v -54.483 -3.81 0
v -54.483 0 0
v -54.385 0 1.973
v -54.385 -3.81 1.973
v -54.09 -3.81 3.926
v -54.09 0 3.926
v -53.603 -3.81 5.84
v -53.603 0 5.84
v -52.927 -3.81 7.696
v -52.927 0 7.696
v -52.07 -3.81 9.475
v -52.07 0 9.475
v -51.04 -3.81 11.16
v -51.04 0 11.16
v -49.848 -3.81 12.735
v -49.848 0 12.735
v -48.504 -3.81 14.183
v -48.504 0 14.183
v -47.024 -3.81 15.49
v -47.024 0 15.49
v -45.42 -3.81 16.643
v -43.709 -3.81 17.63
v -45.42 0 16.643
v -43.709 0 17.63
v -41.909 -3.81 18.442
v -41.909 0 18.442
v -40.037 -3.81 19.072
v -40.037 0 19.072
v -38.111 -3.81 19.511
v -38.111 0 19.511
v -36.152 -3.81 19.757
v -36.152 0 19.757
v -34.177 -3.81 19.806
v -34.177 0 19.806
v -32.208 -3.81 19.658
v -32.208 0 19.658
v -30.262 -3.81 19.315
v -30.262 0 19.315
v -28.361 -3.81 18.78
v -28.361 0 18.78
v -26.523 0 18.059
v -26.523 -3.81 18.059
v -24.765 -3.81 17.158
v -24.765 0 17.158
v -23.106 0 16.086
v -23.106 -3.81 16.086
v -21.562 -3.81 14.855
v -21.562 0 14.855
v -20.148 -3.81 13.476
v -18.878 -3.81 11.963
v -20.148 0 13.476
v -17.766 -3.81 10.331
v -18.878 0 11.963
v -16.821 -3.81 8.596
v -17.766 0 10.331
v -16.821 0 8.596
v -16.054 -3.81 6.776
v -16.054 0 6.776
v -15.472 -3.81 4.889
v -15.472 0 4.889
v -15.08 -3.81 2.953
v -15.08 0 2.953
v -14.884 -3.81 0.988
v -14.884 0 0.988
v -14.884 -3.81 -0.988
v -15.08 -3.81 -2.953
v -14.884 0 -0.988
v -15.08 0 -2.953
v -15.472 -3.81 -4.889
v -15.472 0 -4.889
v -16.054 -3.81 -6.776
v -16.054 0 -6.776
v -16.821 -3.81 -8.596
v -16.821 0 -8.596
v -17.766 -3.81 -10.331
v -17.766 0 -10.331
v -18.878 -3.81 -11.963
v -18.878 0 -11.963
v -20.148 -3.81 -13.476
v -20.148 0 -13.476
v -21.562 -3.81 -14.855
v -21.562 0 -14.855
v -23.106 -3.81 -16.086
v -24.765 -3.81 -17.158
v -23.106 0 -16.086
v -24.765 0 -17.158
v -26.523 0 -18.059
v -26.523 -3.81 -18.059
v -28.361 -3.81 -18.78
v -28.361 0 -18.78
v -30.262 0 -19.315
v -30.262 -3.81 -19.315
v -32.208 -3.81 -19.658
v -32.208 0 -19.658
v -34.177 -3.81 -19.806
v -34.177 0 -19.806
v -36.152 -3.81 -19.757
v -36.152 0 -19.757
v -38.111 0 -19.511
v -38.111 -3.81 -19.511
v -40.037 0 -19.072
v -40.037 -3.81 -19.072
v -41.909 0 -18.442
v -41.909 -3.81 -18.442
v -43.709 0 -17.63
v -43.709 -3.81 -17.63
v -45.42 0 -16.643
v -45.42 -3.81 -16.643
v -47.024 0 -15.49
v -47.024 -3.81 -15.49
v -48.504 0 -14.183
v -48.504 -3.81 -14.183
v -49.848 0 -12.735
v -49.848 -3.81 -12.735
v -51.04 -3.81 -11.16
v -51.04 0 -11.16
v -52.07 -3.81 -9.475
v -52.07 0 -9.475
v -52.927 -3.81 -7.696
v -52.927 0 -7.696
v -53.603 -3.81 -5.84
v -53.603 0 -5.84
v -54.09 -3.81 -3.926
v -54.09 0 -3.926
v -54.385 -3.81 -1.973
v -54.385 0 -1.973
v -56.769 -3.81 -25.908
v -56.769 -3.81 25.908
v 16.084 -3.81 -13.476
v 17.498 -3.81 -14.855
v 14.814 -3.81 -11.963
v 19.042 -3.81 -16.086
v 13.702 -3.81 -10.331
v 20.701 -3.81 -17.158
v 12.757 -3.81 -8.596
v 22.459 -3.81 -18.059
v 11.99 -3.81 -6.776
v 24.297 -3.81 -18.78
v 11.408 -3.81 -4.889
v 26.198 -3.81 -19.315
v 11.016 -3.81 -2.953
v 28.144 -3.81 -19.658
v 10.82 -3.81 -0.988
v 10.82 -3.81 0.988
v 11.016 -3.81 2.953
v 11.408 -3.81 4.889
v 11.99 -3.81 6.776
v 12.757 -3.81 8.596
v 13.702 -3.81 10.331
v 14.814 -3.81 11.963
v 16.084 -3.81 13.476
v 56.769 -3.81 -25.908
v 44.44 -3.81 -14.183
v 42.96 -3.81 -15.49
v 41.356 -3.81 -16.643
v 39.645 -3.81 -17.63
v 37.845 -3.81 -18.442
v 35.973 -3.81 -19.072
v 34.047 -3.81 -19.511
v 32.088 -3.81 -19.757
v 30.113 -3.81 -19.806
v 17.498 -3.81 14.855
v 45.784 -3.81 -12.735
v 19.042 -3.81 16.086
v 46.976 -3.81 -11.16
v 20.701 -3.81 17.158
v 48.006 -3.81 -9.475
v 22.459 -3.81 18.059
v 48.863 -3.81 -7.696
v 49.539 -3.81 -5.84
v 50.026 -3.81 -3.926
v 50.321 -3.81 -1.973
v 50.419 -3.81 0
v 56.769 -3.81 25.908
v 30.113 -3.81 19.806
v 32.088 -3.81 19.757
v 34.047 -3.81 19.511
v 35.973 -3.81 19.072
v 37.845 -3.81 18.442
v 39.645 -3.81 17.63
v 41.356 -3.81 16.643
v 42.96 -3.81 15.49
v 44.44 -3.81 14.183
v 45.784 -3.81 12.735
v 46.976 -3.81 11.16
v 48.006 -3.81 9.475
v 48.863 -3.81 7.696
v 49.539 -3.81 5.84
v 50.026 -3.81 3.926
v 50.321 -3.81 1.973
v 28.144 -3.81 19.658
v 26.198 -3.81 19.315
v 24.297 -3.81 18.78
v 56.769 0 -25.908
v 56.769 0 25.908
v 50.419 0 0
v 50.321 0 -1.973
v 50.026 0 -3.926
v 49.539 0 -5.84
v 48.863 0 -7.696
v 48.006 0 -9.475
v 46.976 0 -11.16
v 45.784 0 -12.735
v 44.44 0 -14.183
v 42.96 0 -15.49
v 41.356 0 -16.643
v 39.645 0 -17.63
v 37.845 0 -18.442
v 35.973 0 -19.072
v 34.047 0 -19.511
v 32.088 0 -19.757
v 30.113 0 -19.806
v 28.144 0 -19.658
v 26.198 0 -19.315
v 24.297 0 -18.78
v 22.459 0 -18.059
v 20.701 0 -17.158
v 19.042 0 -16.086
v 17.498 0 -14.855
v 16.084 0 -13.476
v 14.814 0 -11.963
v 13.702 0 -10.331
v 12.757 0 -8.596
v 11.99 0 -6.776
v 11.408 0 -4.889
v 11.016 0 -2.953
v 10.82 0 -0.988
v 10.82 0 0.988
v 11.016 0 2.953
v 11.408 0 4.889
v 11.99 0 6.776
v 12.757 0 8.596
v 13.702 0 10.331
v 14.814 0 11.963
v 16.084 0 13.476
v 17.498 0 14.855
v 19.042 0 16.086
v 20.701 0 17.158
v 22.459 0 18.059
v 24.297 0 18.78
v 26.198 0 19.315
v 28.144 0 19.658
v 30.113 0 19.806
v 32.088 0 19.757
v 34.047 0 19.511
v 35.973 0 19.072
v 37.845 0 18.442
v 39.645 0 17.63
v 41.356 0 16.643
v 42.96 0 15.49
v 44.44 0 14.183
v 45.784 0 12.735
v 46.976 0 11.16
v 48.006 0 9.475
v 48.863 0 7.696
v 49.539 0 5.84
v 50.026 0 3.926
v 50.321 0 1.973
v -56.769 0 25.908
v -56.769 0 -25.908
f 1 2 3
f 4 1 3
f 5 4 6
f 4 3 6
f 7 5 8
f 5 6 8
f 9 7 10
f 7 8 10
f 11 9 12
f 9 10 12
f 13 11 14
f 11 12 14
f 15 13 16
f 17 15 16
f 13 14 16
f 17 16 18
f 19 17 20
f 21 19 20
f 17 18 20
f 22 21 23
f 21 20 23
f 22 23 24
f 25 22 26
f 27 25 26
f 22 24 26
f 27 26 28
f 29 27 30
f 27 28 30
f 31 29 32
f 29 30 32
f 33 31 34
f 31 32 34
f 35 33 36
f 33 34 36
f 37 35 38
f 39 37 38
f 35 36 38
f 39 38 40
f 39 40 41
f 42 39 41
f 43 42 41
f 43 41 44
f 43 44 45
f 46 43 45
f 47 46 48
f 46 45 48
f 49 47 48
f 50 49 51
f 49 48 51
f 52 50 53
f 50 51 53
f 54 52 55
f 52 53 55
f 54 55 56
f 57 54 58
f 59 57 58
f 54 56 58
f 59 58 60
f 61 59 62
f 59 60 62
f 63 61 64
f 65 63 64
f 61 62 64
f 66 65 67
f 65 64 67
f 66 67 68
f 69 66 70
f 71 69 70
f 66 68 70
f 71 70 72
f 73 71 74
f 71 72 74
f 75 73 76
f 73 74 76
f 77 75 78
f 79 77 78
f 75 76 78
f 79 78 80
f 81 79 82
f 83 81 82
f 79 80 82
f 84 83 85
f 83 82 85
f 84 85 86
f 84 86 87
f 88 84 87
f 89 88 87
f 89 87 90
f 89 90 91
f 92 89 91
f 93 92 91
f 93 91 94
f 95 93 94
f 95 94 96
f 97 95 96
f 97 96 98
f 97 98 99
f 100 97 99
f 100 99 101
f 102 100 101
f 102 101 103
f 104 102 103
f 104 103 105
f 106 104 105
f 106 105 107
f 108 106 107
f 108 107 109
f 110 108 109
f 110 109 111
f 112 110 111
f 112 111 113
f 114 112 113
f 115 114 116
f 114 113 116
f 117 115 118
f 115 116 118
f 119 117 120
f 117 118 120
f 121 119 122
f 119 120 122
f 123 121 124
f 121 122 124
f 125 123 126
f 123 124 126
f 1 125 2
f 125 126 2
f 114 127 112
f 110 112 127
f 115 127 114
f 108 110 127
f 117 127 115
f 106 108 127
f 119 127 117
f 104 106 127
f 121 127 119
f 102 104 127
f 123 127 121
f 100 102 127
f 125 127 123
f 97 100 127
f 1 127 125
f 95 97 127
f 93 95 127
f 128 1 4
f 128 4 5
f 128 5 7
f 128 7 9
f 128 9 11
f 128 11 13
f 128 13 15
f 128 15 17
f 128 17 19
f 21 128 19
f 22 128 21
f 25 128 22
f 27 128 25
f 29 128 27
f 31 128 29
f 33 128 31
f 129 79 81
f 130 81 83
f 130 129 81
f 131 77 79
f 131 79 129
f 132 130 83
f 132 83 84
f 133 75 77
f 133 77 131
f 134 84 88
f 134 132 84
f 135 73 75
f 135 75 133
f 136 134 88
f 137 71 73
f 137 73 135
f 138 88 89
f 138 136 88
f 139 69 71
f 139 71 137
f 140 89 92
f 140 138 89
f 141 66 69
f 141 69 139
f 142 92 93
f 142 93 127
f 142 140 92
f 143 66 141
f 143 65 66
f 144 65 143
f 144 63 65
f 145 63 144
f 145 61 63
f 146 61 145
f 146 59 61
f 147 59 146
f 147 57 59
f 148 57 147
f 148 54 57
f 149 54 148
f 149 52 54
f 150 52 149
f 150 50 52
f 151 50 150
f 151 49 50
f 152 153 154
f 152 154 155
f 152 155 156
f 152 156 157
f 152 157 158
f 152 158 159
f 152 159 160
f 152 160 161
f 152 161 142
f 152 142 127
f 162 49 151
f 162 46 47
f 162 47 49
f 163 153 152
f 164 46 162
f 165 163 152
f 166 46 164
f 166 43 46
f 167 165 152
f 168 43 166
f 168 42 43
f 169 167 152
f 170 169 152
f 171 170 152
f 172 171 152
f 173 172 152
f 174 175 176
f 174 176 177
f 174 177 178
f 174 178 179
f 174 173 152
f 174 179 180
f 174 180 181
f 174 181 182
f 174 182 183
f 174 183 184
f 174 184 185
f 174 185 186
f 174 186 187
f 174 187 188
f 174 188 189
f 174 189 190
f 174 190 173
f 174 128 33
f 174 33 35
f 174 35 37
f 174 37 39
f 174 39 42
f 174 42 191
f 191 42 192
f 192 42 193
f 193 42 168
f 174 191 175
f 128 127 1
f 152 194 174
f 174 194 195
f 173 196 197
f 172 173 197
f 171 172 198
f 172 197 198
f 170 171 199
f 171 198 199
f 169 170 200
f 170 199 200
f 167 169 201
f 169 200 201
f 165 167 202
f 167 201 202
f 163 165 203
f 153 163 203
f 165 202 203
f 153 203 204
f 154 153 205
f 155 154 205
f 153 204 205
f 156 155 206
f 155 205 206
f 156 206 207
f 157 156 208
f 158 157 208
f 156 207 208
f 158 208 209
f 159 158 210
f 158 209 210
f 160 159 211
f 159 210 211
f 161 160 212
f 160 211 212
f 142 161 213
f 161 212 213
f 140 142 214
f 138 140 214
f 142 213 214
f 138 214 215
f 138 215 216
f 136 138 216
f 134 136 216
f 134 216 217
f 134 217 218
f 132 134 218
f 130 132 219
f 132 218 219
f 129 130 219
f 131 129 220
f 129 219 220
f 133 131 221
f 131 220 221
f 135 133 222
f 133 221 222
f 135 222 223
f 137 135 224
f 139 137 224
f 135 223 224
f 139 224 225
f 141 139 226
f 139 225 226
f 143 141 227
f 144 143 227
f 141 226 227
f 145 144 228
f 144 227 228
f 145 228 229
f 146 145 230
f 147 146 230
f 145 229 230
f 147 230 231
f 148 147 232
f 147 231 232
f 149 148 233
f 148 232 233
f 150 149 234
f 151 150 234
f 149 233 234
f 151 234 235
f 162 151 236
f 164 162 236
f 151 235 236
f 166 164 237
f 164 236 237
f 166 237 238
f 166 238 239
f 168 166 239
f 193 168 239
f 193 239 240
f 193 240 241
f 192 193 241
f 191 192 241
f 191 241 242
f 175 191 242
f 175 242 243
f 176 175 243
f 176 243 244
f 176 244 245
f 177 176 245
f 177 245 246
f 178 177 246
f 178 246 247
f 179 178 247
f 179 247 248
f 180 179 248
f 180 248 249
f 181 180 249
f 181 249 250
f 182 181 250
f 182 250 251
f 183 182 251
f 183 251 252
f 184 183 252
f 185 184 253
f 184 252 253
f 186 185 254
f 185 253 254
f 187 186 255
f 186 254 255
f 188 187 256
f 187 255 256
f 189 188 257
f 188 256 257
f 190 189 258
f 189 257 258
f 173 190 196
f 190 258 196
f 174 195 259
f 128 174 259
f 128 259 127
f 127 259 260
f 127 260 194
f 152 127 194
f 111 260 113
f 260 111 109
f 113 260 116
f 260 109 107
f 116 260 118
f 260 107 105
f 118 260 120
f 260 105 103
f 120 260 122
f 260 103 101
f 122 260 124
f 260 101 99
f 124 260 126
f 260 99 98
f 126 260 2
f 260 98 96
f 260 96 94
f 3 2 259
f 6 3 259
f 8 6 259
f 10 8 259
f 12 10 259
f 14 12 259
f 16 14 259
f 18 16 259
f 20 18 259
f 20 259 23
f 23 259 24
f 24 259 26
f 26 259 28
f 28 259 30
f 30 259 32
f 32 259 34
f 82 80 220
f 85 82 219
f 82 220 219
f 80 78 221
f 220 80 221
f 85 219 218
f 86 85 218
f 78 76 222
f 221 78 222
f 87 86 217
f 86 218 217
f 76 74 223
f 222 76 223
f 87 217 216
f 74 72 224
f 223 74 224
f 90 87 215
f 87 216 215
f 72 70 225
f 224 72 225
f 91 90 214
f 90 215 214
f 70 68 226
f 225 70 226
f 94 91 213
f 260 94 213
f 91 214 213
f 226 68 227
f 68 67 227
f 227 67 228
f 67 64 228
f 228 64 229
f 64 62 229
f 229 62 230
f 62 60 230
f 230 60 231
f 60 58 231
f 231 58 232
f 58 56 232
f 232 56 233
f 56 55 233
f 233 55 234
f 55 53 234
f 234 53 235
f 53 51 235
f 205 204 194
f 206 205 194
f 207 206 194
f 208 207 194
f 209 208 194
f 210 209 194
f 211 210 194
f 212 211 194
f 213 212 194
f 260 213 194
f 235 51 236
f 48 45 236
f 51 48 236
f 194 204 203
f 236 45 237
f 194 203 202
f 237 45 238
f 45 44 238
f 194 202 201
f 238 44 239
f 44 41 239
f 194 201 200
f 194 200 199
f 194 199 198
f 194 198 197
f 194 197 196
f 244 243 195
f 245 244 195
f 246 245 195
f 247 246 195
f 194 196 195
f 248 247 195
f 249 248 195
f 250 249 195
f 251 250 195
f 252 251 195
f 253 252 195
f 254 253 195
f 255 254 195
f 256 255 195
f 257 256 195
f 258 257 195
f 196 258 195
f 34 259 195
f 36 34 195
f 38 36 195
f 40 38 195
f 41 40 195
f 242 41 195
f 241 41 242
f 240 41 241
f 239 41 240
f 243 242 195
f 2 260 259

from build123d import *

# Parameters (mm, degrees)
F1_DEPTH = 3.81


with BuildPart() as f1:
    # F0 (on Front) → F1 (new body)
    with BuildSketch(Plane.XZ):
        Polygon((-56.769, 0), (-56.769, -25.908), (56.769, -25.908), (56.769, 0), (56.769, 25.908), (-56.769, 25.908), align=None)
        with BuildLine():
            ThreePointArc((-14.859, 0), (-34.671, -19.812), (-54.483, 0))
            ThreePointArc((-54.483, 0), (-34.671, 19.812), (-14.859, 0))
        make_face(mode=Mode.SUBTRACT)
        with BuildLine():
            ThreePointArc((10.795, 0), (30.607, 19.812), (50.419, 0))
            ThreePointArc((50.419, 0), (30.607, -19.812), (10.795, 0))
        make_face(mode=Mode.SUBTRACT)
    extrude(amount=F1_DEPTH)


solid = f1.part
